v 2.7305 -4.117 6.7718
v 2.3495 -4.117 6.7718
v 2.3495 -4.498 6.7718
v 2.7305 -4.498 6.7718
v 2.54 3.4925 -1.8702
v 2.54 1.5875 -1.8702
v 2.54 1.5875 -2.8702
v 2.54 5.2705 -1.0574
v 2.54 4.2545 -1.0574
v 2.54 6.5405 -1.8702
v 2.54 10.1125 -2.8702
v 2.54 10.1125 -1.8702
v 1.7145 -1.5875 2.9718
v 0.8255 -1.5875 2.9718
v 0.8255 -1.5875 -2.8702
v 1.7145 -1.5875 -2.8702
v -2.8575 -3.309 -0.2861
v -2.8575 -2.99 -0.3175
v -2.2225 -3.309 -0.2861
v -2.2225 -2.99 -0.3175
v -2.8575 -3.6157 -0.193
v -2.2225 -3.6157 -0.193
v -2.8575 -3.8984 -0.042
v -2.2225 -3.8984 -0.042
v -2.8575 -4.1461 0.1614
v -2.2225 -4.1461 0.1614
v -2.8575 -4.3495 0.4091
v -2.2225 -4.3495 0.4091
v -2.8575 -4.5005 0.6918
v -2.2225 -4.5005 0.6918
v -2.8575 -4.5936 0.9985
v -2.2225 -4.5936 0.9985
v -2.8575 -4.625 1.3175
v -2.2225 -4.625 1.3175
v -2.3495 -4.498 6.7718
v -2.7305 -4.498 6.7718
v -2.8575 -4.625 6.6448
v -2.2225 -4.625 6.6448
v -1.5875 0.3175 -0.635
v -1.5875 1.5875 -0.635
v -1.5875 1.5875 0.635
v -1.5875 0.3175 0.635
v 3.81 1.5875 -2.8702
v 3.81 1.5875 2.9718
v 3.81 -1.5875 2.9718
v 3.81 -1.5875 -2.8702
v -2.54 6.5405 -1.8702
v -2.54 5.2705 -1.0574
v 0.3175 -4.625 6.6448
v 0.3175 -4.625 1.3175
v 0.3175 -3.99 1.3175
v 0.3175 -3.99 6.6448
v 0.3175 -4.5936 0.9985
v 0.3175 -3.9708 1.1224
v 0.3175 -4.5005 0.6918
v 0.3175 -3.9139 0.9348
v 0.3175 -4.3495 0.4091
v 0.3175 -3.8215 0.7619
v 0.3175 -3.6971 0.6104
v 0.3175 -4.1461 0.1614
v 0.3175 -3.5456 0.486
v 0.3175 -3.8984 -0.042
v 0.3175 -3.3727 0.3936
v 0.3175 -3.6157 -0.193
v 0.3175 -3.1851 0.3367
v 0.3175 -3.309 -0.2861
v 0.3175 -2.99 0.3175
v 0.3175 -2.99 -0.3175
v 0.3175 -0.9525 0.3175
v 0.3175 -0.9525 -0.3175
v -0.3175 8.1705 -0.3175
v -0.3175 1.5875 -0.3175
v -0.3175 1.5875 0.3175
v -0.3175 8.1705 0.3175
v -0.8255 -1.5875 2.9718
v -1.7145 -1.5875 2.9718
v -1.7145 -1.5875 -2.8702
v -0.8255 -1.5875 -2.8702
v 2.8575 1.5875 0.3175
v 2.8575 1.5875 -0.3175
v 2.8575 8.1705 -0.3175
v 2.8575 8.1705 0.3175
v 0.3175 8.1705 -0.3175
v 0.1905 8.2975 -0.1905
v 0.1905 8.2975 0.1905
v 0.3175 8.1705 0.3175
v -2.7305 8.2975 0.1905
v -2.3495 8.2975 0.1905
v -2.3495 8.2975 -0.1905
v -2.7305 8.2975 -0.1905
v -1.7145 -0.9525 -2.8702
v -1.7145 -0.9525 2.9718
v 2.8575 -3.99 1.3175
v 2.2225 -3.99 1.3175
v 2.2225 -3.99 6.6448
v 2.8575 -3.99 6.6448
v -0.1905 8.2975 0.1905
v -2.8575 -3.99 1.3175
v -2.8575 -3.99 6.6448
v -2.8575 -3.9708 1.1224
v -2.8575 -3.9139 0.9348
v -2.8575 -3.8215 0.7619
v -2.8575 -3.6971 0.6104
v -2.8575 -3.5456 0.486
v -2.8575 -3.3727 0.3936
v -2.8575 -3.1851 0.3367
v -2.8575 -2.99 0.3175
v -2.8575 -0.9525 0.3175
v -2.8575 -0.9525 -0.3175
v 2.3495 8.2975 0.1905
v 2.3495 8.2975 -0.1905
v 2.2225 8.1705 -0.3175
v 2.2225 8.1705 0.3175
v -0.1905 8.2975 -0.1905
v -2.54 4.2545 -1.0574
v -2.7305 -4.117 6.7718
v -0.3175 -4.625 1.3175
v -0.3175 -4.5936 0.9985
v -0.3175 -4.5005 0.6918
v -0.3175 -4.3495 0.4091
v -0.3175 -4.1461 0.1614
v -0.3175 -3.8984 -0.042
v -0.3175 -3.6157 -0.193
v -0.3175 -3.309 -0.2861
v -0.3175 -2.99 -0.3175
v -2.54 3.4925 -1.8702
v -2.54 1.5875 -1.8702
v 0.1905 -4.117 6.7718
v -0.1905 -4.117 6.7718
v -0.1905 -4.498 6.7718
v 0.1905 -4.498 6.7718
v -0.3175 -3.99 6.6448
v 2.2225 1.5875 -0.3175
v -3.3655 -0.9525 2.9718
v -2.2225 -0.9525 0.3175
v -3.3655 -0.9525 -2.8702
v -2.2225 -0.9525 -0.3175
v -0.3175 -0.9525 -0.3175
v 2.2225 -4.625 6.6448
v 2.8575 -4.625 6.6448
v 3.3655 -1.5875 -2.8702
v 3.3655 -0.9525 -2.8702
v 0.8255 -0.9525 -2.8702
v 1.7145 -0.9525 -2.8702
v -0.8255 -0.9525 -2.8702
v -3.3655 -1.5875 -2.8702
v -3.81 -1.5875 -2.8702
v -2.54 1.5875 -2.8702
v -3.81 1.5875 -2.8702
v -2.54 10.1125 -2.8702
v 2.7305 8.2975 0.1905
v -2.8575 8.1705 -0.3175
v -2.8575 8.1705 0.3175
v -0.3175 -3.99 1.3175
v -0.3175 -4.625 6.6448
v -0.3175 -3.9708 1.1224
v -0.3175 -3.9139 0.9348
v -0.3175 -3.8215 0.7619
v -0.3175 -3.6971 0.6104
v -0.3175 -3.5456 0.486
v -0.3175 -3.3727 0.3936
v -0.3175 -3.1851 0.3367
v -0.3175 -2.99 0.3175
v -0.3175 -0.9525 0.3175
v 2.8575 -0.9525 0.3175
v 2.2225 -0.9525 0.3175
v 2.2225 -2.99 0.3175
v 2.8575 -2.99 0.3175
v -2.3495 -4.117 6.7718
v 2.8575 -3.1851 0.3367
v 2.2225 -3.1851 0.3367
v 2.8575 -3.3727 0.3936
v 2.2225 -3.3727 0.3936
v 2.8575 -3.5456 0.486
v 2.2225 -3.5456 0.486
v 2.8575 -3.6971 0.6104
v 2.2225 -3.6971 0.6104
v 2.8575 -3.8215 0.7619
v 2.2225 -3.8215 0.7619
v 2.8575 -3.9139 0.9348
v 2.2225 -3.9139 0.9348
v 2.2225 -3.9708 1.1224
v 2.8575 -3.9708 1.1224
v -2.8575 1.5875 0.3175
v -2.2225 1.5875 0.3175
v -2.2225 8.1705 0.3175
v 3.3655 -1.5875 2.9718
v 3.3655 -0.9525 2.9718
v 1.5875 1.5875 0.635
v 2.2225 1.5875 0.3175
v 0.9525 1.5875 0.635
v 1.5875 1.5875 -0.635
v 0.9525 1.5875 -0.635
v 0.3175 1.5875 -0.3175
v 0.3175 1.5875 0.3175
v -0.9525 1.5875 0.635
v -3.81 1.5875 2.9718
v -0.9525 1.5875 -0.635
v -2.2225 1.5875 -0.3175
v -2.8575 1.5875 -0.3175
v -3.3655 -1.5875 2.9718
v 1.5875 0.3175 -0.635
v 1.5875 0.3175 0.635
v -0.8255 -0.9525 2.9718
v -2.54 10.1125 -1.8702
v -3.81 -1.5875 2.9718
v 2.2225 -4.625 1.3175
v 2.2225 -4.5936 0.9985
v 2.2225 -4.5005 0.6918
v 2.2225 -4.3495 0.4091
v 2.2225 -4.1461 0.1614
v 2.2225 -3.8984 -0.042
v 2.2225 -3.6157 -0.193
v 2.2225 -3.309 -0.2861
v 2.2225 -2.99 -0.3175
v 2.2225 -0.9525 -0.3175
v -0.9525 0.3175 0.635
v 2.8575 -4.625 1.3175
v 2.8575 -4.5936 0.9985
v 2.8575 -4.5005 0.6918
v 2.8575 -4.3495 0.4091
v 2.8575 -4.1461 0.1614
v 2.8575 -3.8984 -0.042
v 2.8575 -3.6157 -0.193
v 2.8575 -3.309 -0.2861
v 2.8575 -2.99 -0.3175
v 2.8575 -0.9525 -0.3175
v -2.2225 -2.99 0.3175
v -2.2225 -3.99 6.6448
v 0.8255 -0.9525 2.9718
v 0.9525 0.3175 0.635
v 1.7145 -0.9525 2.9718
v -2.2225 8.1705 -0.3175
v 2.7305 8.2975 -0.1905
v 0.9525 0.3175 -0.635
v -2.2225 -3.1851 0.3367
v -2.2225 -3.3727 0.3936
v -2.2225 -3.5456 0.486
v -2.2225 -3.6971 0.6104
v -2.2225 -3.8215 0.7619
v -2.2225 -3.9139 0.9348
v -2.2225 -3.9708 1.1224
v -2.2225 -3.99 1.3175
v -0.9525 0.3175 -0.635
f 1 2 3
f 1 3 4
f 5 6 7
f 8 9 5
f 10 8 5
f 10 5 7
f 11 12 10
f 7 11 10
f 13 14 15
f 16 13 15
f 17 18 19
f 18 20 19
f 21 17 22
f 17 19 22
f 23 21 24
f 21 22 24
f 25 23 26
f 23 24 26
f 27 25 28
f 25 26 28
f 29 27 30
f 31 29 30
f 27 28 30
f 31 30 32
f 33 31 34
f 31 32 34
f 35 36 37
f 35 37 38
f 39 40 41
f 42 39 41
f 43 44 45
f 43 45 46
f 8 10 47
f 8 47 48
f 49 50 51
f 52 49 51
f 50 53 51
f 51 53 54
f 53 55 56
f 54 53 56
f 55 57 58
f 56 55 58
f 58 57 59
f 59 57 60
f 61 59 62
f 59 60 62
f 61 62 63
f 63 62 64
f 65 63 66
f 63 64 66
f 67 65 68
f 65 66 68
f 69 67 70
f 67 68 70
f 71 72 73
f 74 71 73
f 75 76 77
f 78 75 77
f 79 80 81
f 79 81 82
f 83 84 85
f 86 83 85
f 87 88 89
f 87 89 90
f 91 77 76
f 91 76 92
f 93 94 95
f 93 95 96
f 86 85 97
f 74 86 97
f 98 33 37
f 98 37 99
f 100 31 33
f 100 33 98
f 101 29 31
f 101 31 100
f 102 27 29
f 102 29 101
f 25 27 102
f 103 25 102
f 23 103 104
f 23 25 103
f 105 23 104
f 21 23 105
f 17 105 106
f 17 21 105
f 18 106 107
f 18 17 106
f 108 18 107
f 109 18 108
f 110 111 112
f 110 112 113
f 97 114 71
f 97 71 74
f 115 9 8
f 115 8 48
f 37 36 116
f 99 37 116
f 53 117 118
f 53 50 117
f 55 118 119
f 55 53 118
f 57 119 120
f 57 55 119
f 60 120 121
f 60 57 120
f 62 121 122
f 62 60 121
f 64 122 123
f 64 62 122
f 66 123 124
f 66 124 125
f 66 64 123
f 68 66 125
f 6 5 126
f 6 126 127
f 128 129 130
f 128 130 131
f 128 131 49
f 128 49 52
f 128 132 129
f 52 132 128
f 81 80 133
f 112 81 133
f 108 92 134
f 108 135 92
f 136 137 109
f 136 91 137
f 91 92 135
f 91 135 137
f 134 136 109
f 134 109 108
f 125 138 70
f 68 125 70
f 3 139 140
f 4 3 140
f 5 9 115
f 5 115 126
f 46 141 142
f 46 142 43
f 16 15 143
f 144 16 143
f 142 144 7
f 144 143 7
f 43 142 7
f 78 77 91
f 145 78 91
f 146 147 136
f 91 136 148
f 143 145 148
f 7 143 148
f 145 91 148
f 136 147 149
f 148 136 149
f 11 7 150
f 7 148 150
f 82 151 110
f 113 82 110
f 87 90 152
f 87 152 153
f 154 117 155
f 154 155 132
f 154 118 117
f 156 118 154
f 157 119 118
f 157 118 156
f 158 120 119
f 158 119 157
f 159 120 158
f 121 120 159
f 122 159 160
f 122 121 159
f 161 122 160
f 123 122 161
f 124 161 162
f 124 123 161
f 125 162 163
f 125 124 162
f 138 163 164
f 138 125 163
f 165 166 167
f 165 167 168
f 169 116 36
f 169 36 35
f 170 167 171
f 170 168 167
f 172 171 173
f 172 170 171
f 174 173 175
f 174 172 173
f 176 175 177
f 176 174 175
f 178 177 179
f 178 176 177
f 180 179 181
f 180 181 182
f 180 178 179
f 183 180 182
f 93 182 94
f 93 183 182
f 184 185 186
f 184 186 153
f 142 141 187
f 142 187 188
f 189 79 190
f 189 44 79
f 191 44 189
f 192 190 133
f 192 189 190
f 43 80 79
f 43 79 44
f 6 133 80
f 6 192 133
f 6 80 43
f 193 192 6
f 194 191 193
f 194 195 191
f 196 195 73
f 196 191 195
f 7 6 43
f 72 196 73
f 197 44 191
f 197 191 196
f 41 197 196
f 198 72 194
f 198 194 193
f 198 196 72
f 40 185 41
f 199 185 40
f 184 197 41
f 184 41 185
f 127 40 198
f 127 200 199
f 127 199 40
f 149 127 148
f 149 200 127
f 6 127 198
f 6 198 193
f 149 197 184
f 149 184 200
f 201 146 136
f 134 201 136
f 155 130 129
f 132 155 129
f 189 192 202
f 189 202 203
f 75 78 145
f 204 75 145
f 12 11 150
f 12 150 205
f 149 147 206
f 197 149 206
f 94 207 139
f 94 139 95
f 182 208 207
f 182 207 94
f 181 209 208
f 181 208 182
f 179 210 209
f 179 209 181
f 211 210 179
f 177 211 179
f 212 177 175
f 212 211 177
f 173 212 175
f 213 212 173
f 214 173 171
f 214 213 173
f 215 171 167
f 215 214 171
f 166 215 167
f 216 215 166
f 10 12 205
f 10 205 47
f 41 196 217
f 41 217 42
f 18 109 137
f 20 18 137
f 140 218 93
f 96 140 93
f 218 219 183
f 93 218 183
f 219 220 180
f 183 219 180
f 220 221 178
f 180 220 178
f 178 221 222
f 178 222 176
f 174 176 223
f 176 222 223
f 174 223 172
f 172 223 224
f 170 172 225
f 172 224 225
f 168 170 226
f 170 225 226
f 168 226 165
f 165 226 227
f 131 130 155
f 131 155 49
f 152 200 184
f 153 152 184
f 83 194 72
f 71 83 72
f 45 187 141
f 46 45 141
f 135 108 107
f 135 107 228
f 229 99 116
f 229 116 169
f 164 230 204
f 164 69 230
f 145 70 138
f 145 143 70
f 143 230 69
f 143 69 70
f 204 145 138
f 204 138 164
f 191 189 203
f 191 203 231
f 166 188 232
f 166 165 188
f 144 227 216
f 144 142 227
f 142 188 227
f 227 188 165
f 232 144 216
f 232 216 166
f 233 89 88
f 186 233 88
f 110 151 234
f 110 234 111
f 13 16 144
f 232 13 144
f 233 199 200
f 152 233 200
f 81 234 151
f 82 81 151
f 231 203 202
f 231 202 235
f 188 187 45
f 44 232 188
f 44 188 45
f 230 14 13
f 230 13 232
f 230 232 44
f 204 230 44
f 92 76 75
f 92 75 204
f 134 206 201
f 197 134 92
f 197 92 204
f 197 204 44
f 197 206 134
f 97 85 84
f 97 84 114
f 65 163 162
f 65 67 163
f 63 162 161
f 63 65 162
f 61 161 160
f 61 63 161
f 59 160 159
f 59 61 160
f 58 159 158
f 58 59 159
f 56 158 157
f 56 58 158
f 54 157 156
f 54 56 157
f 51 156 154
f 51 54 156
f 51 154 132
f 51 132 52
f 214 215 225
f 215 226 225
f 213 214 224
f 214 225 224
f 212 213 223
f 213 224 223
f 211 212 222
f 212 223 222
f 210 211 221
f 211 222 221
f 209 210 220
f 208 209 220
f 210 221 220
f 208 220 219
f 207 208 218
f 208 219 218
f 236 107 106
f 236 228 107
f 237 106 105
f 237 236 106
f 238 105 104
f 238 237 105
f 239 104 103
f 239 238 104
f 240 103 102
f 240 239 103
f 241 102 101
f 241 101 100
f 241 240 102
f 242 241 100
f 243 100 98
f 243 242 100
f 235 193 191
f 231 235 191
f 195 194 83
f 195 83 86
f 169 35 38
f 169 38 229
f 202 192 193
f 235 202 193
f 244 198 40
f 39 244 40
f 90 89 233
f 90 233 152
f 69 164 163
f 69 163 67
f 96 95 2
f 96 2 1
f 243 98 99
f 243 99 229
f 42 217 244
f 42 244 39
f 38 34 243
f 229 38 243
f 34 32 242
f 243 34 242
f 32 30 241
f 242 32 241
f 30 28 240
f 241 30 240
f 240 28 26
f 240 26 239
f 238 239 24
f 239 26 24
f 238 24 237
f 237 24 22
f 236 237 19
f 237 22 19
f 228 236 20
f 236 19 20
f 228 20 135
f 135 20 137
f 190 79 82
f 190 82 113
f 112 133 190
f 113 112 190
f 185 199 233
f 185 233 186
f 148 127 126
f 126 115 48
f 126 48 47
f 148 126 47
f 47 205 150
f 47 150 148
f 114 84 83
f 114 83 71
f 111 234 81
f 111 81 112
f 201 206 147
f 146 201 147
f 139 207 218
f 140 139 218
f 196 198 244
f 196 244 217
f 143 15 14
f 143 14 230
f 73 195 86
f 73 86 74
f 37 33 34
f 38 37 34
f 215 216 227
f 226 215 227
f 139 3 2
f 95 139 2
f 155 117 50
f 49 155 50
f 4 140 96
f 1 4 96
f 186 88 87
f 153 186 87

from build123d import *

# Parameters (mm, degrees)
SKETCH1_W            = 6.35
SKETCH1_H            = 5.842
BOSS_EXTRUDE1_DEPTH  = 3.175
BOSS_EXTRUDE2_DEPTH  = 5.08
SKETCH3_W            = 5.842
SKETCH3_H            = 3.175
BOSS_EXTRUDE3_DEPTH  = 1.27
SKETCH4_W            = 1.651
SKETCH4_H            = 0.635
CUT_EXTRUDE1_DEPTH   = 6.842
SKETCH5_W            = 0.635
SKETCH5_H            = 0.635
BOSS_EXTRUDE4_DEPTH  = 3.6725
SKETCH6_W            = 0.635
SKETCH6_H            = 0.635
BOSS_EXTRUDE5_DEPTH  = 6.4543
SKETCH7_W            = 1.651
SKETCH7_H            = 0.635
CUT_EXTRUDE2_DEPTH   = 10.642
SKETCH8_W            = 0.635
SKETCH8_H            = 0.635
BOSS_EXTRUDE6_DEPTH  = 3.6725
SKETCH9_W            = 0.635
SKETCH9_H            = 0.635
BOSS_EXTRUDE7_DEPTH  = 6.4543
SKETCH10_W           = 1.651
SKETCH10_H           = 0.635
CUT_EXTRUDE3_DEPTH   = 10.642
SKETCH11_W           = 0.635
SKETCH11_H           = 0.635
BOSS_EXTRUDE8_DEPTH  = 3.6725
SKETCH12_W           = 0.635
SKETCH12_H           = 0.635
BOSS_EXTRUDE9_DEPTH  = 6.4543
SKETCH13_W           = 0.635
SKETCH13_H           = 0.635
BOSS_EXTRUDE10_DEPTH = 6.71
SKETCH14_W           = 0.635
SKETCH14_H           = 0.635
BOSS_EXTRUDE11_DEPTH = 6.71
SKETCH15_W           = 0.635
SKETCH15_H           = 0.635
BOSS_EXTRUDE12_DEPTH = 6.71
SKETCH16_W           = 0.635
SKETCH16_H           = 1.27
CUT_EXTRUDE4_DEPTH   = 1.27
SKETCH17_W           = 0.635
SKETCH17_H           = 1.27
CUT_EXTRUDE5_DEPTH   = 1.27
CHAMFER1_SIZE        = 0.127
CHAMFER2_SIZE        = 0.753913762
CHAMFER2_SIZE2       = 0.55706549
FILLET1_R            = 1
FILLET2_R            = 1.635


with BuildPart() as part:
    # Sketch1 → Boss-Extrude1 (new body)
    with BuildSketch(Plane.XZ.offset(1.5875)):
        with Locations((-0.635, 0.0508)):
            Rectangle(SKETCH1_W, SKETCH1_H)
    extrude(amount=-BOSS_EXTRUDE1_DEPTH)

    # Sketch2 → Boss-Extrude2 (add)
    with BuildSketch(Plane(origin=(2.54, 0, 0), x_dir=(0, 0, -1), z_dir=(1, 0, 0))):
        Polygon((0.651, 4.6355), (1.8702, 3.4925), (1.8702, 1.5875), (2.8702, 1.5875), (2.8702, 10.1125), (1.8702, 10.1125), (1.8702, 6.5405), align=None)
    extrude(amount=-BOSS_EXTRUDE2_DEPTH)

    # Sketch3 → Boss-Extrude3 (add)
    with BuildSketch(Plane(origin=(2.54, 0, 0), x_dir=(0, 0, -1), z_dir=(1, 0, 0))):
        with Locations((-0.0508, 0)):
            Rectangle(SKETCH3_W, SKETCH3_H)
    extrude(amount=BOSS_EXTRUDE3_DEPTH)

    # Sketch4 → Cut-Extrude1 (cut, through all)
    with BuildSketch(Plane(origin=(0, 0, -2.8702), x_dir=(-1, 0, 0), z_dir=(0, 0, -1))):
        with Locations((0, -1.27)):
            Rectangle(SKETCH4_W, SKETCH4_H)
    extrude(amount=-CUT_EXTRUDE1_DEPTH, mode=Mode.SUBTRACT)

    # Sketch5 → Boss-Extrude4 (add)
    with BuildSketch(Plane.XZ.offset(0.9525)):
        Rectangle(SKETCH5_W, SKETCH5_H)
    extrude(amount=BOSS_EXTRUDE4_DEPTH)

    # Sketch6 → Boss-Extrude5 (add)
    with BuildSketch(Plane.XY.offset(0.3175)):
        with Locations((0, -4.3075)):
            Rectangle(SKETCH6_W, SKETCH6_H)
    extrude(amount=BOSS_EXTRUDE5_DEPTH)

    # Sketch7 → Cut-Extrude2 (cut, through all)
    with BuildSketch(Plane(origin=(0, 0, -2.8702), x_dir=(-1, 0, 0), z_dir=(0, 0, -1))):
        with Locations((2.54, -1.27)):
            Rectangle(SKETCH7_W, SKETCH7_H)
    extrude(amount=-CUT_EXTRUDE2_DEPTH, mode=Mode.SUBTRACT)

    # Sketch8 → Boss-Extrude6 (add)
    with BuildSketch(Plane.XZ.offset(0.9525)):
        with Locations((-2.54, 0)):
            Rectangle(SKETCH8_W, SKETCH8_H)
    extrude(amount=BOSS_EXTRUDE6_DEPTH)

    # Sketch9 → Boss-Extrude7 (add)
    with BuildSketch(Plane.XY.offset(0.3175)):
        with Locations((-2.54, -4.3075)):
            Rectangle(SKETCH9_W, SKETCH9_H)
    extrude(amount=BOSS_EXTRUDE7_DEPTH)

    # Sketch10 → Cut-Extrude3 (cut, through all)
    with BuildSketch(Plane(origin=(0, 0, -2.8702), x_dir=(-1, 0, 0), z_dir=(0, 0, -1))):
        with Locations((-2.54, -1.27)):
            Rectangle(SKETCH10_W, SKETCH10_H)
    extrude(amount=-CUT_EXTRUDE3_DEPTH, mode=Mode.SUBTRACT)

    # Sketch11 → Boss-Extrude8 (add)
    with BuildSketch(Plane.XZ.offset(0.9525)):
        with Locations((2.54, 0)):
            Rectangle(SKETCH11_W, SKETCH11_H)
    extrude(amount=BOSS_EXTRUDE8_DEPTH)

    # Sketch12 → Boss-Extrude9 (add)
    with BuildSketch(Plane.XY.offset(0.3175)):
        with Locations((2.54, -4.3075)):
            Rectangle(SKETCH12_W, SKETCH12_H)
    extrude(amount=BOSS_EXTRUDE9_DEPTH)

    # Sketch13 → Boss-Extrude10 (add)
    with BuildSketch(Plane(origin=(0, 1.5875, 0), x_dir=(-1, 0, 0), z_dir=(0, 1, 0))):
        with Locations((-2.54, 0)):
            Rectangle(SKETCH13_W, SKETCH13_H)
    extrude(amount=BOSS_EXTRUDE10_DEPTH)

    # Sketch14 → Boss-Extrude11 (add)
    with BuildSketch(Plane(origin=(0, 1.5875, 0), x_dir=(-1, 0, 0), z_dir=(0, 1, 0))):
        Rectangle(SKETCH14_W, SKETCH14_H)
    extrude(amount=BOSS_EXTRUDE11_DEPTH)

    # Sketch15 → Boss-Extrude12 (add)
    with BuildSketch(Plane(origin=(0, 1.5875, 0), x_dir=(-1, 0, 0), z_dir=(0, 1, 0))):
        with Locations((2.54, 0)):
            Rectangle(SKETCH15_W, SKETCH15_H)
    extrude(amount=BOSS_EXTRUDE12_DEPTH)

    # Sketch16 → Cut-Extrude4 (cut)
    with BuildSketch(Plane(origin=(0, 1.5875, 0), x_dir=(-1, 0, 0), z_dir=(0, 1, 0))):
        with Locations((-1.27, 0)):
            Rectangle(SKETCH16_W, SKETCH16_H)
    extrude(amount=-CUT_EXTRUDE4_DEPTH, mode=Mode.SUBTRACT)

    # Sketch17 → Cut-Extrude5 (cut)
    with BuildSketch(Plane(origin=(0, 1.5875, 0), x_dir=(-1, 0, 0), z_dir=(0, 1, 0))):
        with Locations((1.27, 0)):
            Rectangle(SKETCH17_W, SKETCH17_H)
    extrude(amount=-CUT_EXTRUDE5_DEPTH, mode=Mode.SUBTRACT)

    # Chamfer1
    chamfer1_edges = [part.edges().sort_by_distance(p)[0] for p in [
        (-2.54, -3.99, 6.7718),
        (-2.8575, -4.3075, 6.7718),
        (-2.54, -4.625, 6.7718),
        (-2.2225, -4.3075, 6.7718),
        (2.8575, -4.3075, 6.7718),
        (2.54, -3.99, 6.7718),
        (2.2225, -4.3075, 6.7718),
        (2.54, -4.625, 6.7718),
        (2.2225, 8.2975, 0),
        (2.54, 8.2975, 0.3175),
        (2.8575, 8.2975, 0),
        (2.54, 8.2975, -0.3175),
        (0.3175, 8.2975, 0),
        (0, 8.2975, -0.3175),
        (-0.3175, 8.2975, 0),
        (0, 8.2975, 0.3175),
        (-2.54, 8.2975, 0.3175),
        (-2.2225, 8.2975, 0),
        (-2.54, 8.2975, -0.3175),
        (-2.8575, 8.2975, 0),
        (0, -3.99, 6.7718),
        (-0.3175, -4.3075, 6.7718),
        (0, -4.625, 6.7718),
        (0.3175, -4.3075, 6.7718),
    ]]
    chamfer(chamfer1_edges, length=CHAMFER1_SIZE)

    # Chamfer2
    chamfer2_edges = [part.edges().sort_by_distance(p)[0] for p in [
        (0, 4.6355, -0.651),
    ]]
    chamfer2_side = [part.faces().sort_by_distance(p)[0] for p in [
        (0, 5.588, -1.2606),
    ]]
    chamfer(chamfer2_edges, length=CHAMFER2_SIZE, length2=CHAMFER2_SIZE2, reference=chamfer2_side[0])

    # Fillet1
    fillet1_edges = [part.edges().sort_by_distance(p)[0] for p in [
        (-2.54, -3.99, 0.3175),
        (2.54, -3.99, 0.3175),
        (0, -3.99, 0.3175),
    ]]
    fillet(fillet1_edges, radius=FILLET1_R)

    # Fillet2
    fillet2_edges = [part.edges().sort_by_distance(p)[0] for p in [
        (-2.54, -4.625, -0.3175),
        (2.54, -4.625, -0.3175),
        (0, -4.625, -0.3175),
    ]]
    fillet(fillet2_edges, radius=FILLET2_R)


solid = part.part
